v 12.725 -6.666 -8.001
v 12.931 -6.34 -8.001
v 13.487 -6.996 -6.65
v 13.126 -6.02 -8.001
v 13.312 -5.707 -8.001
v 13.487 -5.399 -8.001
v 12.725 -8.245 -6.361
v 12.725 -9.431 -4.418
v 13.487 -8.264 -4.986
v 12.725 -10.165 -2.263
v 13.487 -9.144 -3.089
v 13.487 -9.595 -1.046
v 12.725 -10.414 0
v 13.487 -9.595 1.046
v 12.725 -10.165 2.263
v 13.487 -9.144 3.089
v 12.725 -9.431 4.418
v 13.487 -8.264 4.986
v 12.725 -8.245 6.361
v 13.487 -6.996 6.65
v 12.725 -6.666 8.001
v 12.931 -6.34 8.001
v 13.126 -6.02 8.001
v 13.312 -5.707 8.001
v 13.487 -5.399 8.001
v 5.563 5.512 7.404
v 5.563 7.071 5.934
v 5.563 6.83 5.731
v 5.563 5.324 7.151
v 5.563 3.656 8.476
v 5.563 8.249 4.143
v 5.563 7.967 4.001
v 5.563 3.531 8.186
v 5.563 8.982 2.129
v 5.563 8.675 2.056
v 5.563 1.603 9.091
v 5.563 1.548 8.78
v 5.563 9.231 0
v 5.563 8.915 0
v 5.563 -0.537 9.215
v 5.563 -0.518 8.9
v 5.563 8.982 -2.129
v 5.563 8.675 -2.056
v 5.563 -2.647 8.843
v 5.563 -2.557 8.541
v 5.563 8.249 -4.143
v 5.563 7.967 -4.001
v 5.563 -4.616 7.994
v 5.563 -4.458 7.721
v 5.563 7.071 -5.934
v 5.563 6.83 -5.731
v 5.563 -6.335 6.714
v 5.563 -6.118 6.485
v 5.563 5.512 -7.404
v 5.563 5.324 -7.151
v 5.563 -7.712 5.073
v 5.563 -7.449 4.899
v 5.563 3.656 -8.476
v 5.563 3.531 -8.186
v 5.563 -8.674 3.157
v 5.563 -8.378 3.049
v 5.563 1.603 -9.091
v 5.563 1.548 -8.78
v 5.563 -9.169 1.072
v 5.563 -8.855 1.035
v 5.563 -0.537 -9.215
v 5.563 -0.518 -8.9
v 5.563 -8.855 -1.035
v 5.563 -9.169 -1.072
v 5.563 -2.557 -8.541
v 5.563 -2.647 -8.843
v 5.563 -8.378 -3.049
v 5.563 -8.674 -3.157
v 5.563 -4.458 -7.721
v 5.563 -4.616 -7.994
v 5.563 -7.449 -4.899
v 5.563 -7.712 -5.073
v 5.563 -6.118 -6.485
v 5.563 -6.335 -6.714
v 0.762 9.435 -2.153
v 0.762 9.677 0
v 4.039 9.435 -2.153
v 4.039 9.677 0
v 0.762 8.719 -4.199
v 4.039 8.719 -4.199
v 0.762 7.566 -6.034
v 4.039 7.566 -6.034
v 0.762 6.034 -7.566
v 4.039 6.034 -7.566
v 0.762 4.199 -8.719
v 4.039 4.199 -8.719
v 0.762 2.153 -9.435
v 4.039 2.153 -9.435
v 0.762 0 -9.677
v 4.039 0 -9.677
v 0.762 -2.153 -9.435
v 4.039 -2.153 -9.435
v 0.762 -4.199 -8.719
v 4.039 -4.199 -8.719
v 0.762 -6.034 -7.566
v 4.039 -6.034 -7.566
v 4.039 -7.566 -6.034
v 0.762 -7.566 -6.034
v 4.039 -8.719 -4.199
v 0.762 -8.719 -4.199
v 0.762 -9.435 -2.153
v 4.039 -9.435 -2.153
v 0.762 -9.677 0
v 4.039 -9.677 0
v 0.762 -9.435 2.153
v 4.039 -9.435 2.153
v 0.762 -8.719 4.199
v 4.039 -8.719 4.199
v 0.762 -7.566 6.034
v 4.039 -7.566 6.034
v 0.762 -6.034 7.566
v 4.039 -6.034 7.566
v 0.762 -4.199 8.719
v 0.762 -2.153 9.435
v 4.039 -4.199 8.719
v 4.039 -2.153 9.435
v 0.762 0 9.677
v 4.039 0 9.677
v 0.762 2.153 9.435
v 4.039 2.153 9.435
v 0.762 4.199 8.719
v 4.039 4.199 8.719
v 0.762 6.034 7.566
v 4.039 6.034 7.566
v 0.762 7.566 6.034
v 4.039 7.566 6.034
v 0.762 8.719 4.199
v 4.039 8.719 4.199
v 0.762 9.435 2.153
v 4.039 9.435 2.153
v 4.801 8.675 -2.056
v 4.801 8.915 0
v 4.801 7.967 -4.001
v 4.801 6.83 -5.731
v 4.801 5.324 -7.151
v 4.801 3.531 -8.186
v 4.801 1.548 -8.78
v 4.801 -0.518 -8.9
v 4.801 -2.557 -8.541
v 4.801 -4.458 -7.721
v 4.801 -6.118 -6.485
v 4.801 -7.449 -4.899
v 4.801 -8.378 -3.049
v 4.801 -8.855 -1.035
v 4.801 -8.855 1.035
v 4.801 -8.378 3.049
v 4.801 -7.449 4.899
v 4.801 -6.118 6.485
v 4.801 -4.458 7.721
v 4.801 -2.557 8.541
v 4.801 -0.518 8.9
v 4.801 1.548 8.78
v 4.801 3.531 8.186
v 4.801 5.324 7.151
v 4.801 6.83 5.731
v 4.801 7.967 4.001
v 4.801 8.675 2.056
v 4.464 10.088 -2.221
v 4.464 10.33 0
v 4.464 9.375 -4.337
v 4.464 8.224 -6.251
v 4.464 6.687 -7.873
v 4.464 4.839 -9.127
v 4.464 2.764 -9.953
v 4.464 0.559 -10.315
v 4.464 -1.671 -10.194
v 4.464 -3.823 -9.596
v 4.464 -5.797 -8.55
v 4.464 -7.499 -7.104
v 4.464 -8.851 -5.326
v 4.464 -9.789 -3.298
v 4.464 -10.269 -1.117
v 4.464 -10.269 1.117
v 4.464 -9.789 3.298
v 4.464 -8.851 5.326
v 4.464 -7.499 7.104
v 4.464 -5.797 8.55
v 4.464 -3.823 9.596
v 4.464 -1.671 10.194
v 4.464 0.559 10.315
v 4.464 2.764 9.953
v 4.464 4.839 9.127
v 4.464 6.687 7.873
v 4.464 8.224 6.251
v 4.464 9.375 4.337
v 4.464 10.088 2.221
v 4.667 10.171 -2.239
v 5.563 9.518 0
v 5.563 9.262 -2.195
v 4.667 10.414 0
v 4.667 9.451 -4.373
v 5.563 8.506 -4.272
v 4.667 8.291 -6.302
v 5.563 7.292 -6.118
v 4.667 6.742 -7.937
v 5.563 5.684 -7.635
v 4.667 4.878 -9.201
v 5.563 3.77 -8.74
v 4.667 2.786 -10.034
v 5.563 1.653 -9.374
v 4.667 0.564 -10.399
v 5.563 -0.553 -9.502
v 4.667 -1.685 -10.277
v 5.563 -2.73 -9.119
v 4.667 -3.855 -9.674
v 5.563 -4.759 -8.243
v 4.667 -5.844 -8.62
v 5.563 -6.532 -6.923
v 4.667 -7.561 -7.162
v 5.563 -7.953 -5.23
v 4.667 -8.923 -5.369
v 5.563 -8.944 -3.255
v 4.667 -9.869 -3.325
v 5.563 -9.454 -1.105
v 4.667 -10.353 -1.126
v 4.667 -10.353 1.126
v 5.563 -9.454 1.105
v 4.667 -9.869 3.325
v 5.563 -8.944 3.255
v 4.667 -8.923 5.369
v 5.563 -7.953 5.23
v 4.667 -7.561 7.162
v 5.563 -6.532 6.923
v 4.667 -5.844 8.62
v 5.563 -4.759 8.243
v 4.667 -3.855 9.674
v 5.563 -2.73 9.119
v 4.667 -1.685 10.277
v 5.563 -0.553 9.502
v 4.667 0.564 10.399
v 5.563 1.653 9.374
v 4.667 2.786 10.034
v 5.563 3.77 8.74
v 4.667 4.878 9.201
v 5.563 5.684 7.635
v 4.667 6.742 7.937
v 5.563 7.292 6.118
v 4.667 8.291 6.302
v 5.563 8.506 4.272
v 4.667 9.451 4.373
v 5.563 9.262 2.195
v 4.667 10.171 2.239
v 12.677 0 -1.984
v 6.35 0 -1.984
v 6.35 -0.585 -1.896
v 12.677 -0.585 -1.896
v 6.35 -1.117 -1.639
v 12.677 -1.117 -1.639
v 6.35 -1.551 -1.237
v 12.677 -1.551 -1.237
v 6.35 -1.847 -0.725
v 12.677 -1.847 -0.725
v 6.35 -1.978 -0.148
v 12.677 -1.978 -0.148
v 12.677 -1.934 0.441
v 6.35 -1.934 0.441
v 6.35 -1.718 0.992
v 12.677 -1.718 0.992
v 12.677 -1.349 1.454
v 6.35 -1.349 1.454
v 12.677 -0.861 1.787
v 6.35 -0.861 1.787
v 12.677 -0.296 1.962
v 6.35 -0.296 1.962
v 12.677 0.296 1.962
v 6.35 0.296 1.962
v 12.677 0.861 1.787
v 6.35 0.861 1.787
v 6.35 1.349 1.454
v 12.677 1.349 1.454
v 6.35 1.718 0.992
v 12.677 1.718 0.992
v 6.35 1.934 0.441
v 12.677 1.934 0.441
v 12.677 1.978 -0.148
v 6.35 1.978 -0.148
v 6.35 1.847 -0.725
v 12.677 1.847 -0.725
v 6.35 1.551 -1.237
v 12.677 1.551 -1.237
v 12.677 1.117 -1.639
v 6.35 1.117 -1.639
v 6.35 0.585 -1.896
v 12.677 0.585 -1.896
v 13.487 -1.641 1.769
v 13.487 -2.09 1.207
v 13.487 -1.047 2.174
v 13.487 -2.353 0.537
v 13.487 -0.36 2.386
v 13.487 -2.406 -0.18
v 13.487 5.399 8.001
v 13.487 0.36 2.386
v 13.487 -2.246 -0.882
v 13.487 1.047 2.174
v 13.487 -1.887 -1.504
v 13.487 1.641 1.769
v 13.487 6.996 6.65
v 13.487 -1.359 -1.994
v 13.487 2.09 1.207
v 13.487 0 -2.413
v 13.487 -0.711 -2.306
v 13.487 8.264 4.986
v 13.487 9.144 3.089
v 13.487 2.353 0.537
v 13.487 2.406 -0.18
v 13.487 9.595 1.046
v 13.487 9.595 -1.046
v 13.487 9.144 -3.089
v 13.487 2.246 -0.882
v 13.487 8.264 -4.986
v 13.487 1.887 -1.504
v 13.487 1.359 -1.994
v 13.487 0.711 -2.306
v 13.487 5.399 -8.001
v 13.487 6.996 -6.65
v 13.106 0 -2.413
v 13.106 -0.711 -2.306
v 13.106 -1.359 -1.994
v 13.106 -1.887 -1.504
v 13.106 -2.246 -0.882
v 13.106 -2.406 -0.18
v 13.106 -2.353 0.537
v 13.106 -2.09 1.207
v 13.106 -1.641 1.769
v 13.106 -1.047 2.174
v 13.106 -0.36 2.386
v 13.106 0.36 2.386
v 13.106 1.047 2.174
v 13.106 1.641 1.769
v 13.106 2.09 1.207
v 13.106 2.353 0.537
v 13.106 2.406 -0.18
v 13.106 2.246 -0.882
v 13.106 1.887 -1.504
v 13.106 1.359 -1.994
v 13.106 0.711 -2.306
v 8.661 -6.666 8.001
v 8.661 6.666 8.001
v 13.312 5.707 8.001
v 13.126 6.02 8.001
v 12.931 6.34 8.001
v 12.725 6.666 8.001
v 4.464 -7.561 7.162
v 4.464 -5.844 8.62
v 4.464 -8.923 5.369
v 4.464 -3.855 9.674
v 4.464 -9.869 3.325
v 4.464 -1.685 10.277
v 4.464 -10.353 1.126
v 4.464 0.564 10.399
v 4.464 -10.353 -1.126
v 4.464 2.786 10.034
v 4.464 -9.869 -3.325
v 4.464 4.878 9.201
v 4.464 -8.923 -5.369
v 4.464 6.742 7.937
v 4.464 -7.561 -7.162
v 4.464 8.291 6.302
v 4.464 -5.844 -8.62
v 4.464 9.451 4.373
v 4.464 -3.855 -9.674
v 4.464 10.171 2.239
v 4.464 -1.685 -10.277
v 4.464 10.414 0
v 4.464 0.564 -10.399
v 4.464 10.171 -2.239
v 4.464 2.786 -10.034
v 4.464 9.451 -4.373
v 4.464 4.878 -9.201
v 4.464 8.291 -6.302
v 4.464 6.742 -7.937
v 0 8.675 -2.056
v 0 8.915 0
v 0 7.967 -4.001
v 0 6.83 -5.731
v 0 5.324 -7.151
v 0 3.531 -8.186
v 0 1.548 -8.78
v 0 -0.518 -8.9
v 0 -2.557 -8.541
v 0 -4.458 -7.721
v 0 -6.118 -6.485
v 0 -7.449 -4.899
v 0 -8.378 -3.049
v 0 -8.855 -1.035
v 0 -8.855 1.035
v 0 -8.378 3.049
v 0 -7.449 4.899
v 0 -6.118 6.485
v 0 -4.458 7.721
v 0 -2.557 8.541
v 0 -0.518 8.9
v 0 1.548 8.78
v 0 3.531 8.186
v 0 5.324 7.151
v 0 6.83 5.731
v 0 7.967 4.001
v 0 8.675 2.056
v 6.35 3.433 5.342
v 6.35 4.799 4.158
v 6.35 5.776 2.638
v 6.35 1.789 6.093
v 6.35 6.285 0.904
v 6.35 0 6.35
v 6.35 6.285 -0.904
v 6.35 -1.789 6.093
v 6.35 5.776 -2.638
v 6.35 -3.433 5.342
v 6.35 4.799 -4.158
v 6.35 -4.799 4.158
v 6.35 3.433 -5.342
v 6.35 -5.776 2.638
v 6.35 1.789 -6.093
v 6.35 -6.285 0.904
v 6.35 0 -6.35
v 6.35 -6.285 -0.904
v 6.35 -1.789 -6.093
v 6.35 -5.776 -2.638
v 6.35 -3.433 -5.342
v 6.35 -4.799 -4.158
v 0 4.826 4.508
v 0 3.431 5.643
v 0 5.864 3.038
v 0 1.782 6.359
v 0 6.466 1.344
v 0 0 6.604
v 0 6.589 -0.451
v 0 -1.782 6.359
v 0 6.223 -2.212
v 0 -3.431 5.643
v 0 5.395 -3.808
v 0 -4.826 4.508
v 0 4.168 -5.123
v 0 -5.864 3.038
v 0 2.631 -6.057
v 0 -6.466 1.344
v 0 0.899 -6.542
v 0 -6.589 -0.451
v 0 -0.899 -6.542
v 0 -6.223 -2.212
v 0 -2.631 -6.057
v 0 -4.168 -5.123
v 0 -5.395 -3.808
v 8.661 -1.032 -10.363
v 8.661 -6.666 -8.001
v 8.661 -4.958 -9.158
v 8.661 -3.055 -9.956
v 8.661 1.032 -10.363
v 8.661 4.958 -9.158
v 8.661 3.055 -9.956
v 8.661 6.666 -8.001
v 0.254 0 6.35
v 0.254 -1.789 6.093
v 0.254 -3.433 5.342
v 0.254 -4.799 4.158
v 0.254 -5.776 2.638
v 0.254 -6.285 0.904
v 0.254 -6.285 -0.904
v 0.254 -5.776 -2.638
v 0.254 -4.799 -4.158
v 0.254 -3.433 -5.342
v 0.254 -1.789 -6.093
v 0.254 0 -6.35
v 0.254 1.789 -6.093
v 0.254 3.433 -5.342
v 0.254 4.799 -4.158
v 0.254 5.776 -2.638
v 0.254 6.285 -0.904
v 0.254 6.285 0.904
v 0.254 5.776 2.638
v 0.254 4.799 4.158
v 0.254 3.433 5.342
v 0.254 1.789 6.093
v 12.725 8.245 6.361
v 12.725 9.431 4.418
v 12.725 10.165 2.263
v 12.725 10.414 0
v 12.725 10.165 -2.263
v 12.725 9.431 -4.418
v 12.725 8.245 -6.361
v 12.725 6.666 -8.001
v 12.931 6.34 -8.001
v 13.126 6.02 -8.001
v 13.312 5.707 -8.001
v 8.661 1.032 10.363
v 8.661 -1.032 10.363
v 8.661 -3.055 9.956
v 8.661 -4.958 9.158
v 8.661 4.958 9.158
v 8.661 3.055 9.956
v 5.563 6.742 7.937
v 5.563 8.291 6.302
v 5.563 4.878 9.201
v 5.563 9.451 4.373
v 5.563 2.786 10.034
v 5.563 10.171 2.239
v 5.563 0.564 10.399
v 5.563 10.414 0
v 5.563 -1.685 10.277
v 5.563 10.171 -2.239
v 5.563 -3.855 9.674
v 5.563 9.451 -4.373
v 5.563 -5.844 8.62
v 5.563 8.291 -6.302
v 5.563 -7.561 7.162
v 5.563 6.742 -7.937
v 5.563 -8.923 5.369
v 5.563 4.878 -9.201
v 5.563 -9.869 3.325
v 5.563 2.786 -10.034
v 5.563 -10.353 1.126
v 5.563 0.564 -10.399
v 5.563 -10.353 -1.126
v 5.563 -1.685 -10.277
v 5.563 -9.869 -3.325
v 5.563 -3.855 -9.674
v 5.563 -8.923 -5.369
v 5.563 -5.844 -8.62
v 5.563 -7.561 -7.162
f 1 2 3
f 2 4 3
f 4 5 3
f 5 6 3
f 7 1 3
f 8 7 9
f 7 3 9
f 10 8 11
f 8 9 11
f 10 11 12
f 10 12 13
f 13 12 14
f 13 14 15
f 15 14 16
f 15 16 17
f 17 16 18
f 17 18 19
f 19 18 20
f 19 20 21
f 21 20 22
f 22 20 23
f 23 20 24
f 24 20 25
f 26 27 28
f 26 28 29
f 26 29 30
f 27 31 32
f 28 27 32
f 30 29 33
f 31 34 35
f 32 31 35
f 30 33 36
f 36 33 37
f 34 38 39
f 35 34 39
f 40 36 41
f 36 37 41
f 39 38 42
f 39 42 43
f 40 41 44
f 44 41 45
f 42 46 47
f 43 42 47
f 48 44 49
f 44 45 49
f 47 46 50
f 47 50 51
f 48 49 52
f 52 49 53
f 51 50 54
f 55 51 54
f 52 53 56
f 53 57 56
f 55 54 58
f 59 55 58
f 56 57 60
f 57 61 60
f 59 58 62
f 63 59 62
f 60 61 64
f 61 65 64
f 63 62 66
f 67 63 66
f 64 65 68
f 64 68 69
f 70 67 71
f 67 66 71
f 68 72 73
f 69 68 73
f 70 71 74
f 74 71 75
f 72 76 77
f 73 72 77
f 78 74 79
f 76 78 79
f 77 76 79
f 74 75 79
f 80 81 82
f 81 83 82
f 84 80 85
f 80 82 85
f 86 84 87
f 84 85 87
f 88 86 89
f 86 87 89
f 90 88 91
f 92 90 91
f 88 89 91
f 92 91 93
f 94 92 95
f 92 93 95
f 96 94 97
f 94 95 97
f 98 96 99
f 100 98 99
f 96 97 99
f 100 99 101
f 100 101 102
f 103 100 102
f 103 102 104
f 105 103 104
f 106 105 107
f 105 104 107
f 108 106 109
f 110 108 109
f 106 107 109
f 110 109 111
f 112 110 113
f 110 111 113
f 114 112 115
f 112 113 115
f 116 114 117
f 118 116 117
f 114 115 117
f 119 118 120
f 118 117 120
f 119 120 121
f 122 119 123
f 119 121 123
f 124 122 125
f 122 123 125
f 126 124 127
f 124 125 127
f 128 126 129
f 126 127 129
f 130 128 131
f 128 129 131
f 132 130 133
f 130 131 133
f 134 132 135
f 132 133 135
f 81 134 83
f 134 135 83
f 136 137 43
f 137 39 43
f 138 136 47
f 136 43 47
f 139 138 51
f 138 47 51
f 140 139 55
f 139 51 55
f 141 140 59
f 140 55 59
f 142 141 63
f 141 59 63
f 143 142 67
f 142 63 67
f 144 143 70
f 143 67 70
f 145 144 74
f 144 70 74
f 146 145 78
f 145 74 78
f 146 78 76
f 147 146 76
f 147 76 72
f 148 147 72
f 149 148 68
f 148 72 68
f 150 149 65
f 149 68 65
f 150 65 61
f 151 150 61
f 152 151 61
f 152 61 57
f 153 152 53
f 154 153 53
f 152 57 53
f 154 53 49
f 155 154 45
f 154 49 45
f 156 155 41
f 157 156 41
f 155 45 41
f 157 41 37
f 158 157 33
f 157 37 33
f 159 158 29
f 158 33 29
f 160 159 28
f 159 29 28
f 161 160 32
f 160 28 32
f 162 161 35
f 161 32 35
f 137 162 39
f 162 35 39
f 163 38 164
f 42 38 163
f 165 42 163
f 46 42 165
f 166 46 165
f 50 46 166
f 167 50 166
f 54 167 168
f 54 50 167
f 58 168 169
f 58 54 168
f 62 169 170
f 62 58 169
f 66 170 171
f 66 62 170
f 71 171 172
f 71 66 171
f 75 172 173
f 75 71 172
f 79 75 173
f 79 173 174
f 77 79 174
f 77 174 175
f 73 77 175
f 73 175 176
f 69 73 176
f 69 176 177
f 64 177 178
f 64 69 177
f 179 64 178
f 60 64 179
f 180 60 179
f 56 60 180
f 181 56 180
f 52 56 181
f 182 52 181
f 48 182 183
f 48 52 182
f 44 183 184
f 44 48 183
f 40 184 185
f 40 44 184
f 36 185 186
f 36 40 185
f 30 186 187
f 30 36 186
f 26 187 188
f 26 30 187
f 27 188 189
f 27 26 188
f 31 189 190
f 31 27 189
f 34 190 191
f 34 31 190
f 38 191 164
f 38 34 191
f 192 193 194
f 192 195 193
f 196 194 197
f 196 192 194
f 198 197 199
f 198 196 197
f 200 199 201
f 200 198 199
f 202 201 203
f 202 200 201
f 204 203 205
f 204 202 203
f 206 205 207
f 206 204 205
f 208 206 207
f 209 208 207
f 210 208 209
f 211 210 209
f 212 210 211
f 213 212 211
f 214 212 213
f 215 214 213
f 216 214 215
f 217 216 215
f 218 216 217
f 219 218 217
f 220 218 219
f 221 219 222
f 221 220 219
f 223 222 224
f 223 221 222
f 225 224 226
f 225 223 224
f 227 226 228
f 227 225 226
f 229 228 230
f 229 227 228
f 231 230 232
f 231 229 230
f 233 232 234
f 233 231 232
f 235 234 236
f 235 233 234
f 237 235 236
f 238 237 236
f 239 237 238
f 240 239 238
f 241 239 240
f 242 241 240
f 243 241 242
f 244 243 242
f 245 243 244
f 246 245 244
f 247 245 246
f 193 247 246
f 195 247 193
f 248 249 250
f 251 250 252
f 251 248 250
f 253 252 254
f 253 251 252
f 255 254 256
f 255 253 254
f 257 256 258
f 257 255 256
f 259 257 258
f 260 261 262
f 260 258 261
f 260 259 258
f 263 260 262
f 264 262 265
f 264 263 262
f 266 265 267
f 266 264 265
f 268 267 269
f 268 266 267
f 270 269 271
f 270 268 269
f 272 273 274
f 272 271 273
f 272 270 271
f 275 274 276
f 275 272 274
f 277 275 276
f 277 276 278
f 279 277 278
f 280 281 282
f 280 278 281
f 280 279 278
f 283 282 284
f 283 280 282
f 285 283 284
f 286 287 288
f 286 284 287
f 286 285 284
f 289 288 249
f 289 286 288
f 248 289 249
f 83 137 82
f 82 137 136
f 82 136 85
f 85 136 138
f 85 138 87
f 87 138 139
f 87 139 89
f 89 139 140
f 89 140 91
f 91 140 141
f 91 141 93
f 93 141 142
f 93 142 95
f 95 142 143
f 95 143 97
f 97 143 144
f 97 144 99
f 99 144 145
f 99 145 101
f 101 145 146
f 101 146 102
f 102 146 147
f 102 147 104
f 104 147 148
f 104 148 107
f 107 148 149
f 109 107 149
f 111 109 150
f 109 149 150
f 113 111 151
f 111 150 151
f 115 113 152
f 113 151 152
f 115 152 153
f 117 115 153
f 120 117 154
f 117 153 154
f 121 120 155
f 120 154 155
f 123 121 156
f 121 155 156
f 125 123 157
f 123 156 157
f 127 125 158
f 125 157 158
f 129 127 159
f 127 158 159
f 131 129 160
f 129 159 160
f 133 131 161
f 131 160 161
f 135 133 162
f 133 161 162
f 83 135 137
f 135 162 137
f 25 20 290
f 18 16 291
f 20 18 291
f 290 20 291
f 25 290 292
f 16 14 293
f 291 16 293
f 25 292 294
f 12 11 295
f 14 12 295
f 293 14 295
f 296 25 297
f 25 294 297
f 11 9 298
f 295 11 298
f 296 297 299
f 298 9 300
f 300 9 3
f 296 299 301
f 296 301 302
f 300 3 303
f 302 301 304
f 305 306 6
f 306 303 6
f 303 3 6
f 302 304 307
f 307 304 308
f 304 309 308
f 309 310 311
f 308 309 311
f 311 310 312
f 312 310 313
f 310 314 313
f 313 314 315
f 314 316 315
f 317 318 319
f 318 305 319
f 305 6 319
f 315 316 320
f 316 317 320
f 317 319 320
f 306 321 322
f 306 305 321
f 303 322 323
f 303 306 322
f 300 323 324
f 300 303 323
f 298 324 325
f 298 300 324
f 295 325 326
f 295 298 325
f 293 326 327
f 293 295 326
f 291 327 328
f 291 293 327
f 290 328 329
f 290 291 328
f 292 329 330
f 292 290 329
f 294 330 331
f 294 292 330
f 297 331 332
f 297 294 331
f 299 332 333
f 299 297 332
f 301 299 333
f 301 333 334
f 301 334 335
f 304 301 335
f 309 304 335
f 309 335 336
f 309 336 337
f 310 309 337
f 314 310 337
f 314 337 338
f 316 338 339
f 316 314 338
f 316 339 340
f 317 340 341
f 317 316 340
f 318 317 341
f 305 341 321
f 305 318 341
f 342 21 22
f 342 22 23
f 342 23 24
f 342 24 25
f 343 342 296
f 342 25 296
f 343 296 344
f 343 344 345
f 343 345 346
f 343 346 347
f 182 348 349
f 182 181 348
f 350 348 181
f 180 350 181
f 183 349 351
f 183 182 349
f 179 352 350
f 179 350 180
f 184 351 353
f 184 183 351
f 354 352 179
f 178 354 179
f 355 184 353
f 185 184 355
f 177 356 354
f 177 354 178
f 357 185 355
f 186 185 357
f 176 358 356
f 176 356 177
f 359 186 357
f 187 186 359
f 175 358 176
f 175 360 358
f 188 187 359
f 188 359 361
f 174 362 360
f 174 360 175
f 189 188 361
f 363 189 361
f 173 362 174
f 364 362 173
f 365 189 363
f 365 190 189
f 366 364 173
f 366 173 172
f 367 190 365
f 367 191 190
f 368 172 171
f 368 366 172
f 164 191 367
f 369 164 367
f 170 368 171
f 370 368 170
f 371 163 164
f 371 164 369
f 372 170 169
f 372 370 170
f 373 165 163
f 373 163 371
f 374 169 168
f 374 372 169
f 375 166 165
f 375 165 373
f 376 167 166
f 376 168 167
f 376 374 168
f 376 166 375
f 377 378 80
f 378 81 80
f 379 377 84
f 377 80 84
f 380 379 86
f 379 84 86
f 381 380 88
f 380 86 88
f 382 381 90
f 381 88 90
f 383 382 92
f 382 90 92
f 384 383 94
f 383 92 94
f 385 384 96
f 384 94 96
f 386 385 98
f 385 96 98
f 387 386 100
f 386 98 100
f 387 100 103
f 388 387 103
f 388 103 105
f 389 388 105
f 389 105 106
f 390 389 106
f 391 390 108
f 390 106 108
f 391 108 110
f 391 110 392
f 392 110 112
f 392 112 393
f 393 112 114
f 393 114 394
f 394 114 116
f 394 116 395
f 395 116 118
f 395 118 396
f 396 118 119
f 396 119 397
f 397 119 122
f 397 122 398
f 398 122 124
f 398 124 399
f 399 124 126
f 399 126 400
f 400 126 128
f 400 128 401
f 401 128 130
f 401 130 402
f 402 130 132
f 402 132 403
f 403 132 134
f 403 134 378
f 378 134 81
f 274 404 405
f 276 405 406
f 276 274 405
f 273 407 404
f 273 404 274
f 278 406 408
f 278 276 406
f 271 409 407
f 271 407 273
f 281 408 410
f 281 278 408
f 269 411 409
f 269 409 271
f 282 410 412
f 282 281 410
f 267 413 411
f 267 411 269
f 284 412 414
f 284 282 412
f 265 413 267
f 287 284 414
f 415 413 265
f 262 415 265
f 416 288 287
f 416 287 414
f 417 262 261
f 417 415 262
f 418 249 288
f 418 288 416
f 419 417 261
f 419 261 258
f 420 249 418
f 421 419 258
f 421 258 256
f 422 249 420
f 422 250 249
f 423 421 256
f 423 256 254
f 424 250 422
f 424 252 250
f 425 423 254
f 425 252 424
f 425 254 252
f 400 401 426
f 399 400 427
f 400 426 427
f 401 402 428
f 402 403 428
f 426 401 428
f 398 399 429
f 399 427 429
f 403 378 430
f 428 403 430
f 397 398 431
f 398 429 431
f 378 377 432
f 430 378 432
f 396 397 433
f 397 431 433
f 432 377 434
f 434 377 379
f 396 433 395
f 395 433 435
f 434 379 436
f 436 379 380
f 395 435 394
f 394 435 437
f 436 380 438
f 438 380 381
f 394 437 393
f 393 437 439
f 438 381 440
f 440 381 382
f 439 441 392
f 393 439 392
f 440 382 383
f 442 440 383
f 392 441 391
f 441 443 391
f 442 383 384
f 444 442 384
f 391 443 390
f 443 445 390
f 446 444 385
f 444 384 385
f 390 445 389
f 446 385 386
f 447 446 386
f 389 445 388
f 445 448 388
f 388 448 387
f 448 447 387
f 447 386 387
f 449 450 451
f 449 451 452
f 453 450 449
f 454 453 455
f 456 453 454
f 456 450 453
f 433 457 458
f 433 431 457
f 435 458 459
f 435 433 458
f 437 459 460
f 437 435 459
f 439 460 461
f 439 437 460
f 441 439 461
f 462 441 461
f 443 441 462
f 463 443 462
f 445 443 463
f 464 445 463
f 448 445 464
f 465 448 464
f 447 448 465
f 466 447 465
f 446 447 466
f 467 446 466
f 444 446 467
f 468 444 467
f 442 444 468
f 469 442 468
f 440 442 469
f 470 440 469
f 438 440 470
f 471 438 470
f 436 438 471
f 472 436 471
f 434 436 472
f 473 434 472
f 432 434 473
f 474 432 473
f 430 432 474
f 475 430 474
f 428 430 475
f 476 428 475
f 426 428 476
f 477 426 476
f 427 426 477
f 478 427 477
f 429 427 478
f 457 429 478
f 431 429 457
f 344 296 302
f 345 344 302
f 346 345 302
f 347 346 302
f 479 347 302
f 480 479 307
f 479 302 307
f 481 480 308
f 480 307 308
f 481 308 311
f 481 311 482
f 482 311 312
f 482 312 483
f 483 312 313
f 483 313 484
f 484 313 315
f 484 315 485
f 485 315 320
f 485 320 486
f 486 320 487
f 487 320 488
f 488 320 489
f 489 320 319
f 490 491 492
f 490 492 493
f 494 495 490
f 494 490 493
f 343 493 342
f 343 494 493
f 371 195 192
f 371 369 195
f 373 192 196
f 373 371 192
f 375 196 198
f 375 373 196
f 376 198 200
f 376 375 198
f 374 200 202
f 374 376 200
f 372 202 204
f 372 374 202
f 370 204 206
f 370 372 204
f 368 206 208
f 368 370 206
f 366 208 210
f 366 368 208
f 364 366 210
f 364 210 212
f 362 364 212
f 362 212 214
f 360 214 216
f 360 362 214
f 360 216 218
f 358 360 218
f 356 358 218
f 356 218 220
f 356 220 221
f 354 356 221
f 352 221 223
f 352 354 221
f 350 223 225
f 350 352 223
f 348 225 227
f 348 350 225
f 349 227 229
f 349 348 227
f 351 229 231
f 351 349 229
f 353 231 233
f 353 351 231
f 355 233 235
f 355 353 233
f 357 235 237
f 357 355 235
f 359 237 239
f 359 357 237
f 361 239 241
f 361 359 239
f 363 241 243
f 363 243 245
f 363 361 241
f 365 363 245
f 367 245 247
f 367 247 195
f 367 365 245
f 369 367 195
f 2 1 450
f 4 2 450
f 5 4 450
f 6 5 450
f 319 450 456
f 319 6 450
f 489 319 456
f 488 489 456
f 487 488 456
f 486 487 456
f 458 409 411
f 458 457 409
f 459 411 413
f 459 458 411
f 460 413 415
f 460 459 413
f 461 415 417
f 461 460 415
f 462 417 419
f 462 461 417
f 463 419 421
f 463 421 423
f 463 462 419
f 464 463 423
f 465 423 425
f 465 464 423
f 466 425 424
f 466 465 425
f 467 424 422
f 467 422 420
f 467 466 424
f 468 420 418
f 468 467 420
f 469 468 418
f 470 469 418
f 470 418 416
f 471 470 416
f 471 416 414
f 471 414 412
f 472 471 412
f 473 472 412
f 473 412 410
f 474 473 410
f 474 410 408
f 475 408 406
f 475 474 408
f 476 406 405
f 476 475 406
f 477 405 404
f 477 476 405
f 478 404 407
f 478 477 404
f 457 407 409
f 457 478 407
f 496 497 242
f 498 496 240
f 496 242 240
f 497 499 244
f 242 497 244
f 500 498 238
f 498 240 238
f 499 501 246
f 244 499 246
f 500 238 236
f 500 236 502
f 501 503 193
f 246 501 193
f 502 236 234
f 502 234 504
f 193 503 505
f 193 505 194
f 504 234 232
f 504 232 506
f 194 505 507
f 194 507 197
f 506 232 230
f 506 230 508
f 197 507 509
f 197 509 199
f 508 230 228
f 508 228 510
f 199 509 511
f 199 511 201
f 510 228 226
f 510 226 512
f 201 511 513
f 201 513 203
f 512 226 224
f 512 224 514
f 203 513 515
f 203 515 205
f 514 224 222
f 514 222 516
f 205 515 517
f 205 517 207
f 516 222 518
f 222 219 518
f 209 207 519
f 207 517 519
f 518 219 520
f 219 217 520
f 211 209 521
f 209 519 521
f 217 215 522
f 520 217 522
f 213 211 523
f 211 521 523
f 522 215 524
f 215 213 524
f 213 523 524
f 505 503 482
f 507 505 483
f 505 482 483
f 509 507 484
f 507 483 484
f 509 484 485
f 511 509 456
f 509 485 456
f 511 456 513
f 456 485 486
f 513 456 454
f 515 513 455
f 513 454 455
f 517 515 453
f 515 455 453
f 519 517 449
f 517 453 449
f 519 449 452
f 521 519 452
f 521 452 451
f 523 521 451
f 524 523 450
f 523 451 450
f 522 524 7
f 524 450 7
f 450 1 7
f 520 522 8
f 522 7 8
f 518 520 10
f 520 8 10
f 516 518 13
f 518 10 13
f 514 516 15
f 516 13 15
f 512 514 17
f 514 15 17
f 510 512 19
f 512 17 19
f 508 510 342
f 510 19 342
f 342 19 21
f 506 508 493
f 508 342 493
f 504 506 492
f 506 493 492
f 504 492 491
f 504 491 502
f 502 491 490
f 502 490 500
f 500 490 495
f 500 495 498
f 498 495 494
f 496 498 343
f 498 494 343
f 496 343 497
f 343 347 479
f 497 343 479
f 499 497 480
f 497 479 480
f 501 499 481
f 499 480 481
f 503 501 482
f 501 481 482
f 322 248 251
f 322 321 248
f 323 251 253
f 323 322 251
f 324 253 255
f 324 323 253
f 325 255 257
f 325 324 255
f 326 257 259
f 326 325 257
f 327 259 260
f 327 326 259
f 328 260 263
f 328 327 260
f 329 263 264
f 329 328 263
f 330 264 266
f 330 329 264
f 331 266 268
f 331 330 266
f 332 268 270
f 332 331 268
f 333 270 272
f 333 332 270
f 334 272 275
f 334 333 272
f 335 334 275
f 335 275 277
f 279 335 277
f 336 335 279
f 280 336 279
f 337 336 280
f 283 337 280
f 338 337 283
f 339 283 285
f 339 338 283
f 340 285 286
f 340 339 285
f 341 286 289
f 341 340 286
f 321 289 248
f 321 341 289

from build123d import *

# Parameters (mm, degrees)
SKETCH2_W          = 32.004
SKETCH2_H          = 83.312
SKETCH2_W_2        = 16.002
SKETCH2_H_2        = 41.656
CUT_EXTRUDE1_DEPTH = 4.826


with BuildPart() as part:
    # Sketch1 → Revolve1 (revolve)
    with BuildSketch(Plane.XY):
        Polygon((0, 0), (0, 8.9154), (0.762, 9.6774), (4.0386, 9.6774), (4.8006, 8.9154), (5.5626, 8.9154), (5.5626, 10.414), (12.7254, 10.414), (13.4874, 9.652), (13.4874, 0), align=None)
    revolve(axis=Axis((13.4874, 0, 0), (-1, 0, 0)))

    # Sketch2 → Cut-Extrude1 (cut)
    with BuildSketch(Plane(origin=(13.4874, 0, 0), x_dir=(0, 0, -1), z_dir=(1, 0, 0))):
        Rectangle(SKETCH2_W, SKETCH2_H)
        Rectangle(SKETCH2_W_2, SKETCH2_H_2, mode=Mode.SUBTRACT)
    extrude(amount=-CUT_EXTRUDE1_DEPTH, mode=Mode.SUBTRACT)

    # Sketch3 → Hole1 (revolve, cut)
    with BuildSketch(Plane.ZX):
        Polygon((0, 0), (0, 6.35), (6.35, 6.35), (6.35, 0.254), (6.604, 0), align=None)
    revolve(axis=Axis((-6.445314094, 0, 0), (1, 0, 0)), mode=Mode.SUBTRACT)

    # Sketch5 → Hole2 (revolve, cut)
    with BuildSketch(Plane(origin=(13.4874, 0, 0), x_dir=(0, 0, -1), z_dir=(0, 1, 0))):
        Polygon((0, 0), (0, 13.8684), (1.98374, 13.8684), (1.98374, 0.81026), (2.413, 0.381), (2.413, 0), align=None)
    revolve(axis=Axis((19.617423899, 0, 0), (-1, 0, 0)), mode=Mode.SUBTRACT)

    # Sketch7 → Revolve2 (revolve)
    with BuildSketch(Plane.XY):
        Polygon((4.46379893, 10.329831804), (5.878230735, 8.9154), (6.16559893, 8.9154), (4.66699893, 10.414), (4.46379893, 10.414), align=None)
    revolve(axis=Axis((13.4874, 0, 0), (-1, 0, 0)))


solid = part.part
